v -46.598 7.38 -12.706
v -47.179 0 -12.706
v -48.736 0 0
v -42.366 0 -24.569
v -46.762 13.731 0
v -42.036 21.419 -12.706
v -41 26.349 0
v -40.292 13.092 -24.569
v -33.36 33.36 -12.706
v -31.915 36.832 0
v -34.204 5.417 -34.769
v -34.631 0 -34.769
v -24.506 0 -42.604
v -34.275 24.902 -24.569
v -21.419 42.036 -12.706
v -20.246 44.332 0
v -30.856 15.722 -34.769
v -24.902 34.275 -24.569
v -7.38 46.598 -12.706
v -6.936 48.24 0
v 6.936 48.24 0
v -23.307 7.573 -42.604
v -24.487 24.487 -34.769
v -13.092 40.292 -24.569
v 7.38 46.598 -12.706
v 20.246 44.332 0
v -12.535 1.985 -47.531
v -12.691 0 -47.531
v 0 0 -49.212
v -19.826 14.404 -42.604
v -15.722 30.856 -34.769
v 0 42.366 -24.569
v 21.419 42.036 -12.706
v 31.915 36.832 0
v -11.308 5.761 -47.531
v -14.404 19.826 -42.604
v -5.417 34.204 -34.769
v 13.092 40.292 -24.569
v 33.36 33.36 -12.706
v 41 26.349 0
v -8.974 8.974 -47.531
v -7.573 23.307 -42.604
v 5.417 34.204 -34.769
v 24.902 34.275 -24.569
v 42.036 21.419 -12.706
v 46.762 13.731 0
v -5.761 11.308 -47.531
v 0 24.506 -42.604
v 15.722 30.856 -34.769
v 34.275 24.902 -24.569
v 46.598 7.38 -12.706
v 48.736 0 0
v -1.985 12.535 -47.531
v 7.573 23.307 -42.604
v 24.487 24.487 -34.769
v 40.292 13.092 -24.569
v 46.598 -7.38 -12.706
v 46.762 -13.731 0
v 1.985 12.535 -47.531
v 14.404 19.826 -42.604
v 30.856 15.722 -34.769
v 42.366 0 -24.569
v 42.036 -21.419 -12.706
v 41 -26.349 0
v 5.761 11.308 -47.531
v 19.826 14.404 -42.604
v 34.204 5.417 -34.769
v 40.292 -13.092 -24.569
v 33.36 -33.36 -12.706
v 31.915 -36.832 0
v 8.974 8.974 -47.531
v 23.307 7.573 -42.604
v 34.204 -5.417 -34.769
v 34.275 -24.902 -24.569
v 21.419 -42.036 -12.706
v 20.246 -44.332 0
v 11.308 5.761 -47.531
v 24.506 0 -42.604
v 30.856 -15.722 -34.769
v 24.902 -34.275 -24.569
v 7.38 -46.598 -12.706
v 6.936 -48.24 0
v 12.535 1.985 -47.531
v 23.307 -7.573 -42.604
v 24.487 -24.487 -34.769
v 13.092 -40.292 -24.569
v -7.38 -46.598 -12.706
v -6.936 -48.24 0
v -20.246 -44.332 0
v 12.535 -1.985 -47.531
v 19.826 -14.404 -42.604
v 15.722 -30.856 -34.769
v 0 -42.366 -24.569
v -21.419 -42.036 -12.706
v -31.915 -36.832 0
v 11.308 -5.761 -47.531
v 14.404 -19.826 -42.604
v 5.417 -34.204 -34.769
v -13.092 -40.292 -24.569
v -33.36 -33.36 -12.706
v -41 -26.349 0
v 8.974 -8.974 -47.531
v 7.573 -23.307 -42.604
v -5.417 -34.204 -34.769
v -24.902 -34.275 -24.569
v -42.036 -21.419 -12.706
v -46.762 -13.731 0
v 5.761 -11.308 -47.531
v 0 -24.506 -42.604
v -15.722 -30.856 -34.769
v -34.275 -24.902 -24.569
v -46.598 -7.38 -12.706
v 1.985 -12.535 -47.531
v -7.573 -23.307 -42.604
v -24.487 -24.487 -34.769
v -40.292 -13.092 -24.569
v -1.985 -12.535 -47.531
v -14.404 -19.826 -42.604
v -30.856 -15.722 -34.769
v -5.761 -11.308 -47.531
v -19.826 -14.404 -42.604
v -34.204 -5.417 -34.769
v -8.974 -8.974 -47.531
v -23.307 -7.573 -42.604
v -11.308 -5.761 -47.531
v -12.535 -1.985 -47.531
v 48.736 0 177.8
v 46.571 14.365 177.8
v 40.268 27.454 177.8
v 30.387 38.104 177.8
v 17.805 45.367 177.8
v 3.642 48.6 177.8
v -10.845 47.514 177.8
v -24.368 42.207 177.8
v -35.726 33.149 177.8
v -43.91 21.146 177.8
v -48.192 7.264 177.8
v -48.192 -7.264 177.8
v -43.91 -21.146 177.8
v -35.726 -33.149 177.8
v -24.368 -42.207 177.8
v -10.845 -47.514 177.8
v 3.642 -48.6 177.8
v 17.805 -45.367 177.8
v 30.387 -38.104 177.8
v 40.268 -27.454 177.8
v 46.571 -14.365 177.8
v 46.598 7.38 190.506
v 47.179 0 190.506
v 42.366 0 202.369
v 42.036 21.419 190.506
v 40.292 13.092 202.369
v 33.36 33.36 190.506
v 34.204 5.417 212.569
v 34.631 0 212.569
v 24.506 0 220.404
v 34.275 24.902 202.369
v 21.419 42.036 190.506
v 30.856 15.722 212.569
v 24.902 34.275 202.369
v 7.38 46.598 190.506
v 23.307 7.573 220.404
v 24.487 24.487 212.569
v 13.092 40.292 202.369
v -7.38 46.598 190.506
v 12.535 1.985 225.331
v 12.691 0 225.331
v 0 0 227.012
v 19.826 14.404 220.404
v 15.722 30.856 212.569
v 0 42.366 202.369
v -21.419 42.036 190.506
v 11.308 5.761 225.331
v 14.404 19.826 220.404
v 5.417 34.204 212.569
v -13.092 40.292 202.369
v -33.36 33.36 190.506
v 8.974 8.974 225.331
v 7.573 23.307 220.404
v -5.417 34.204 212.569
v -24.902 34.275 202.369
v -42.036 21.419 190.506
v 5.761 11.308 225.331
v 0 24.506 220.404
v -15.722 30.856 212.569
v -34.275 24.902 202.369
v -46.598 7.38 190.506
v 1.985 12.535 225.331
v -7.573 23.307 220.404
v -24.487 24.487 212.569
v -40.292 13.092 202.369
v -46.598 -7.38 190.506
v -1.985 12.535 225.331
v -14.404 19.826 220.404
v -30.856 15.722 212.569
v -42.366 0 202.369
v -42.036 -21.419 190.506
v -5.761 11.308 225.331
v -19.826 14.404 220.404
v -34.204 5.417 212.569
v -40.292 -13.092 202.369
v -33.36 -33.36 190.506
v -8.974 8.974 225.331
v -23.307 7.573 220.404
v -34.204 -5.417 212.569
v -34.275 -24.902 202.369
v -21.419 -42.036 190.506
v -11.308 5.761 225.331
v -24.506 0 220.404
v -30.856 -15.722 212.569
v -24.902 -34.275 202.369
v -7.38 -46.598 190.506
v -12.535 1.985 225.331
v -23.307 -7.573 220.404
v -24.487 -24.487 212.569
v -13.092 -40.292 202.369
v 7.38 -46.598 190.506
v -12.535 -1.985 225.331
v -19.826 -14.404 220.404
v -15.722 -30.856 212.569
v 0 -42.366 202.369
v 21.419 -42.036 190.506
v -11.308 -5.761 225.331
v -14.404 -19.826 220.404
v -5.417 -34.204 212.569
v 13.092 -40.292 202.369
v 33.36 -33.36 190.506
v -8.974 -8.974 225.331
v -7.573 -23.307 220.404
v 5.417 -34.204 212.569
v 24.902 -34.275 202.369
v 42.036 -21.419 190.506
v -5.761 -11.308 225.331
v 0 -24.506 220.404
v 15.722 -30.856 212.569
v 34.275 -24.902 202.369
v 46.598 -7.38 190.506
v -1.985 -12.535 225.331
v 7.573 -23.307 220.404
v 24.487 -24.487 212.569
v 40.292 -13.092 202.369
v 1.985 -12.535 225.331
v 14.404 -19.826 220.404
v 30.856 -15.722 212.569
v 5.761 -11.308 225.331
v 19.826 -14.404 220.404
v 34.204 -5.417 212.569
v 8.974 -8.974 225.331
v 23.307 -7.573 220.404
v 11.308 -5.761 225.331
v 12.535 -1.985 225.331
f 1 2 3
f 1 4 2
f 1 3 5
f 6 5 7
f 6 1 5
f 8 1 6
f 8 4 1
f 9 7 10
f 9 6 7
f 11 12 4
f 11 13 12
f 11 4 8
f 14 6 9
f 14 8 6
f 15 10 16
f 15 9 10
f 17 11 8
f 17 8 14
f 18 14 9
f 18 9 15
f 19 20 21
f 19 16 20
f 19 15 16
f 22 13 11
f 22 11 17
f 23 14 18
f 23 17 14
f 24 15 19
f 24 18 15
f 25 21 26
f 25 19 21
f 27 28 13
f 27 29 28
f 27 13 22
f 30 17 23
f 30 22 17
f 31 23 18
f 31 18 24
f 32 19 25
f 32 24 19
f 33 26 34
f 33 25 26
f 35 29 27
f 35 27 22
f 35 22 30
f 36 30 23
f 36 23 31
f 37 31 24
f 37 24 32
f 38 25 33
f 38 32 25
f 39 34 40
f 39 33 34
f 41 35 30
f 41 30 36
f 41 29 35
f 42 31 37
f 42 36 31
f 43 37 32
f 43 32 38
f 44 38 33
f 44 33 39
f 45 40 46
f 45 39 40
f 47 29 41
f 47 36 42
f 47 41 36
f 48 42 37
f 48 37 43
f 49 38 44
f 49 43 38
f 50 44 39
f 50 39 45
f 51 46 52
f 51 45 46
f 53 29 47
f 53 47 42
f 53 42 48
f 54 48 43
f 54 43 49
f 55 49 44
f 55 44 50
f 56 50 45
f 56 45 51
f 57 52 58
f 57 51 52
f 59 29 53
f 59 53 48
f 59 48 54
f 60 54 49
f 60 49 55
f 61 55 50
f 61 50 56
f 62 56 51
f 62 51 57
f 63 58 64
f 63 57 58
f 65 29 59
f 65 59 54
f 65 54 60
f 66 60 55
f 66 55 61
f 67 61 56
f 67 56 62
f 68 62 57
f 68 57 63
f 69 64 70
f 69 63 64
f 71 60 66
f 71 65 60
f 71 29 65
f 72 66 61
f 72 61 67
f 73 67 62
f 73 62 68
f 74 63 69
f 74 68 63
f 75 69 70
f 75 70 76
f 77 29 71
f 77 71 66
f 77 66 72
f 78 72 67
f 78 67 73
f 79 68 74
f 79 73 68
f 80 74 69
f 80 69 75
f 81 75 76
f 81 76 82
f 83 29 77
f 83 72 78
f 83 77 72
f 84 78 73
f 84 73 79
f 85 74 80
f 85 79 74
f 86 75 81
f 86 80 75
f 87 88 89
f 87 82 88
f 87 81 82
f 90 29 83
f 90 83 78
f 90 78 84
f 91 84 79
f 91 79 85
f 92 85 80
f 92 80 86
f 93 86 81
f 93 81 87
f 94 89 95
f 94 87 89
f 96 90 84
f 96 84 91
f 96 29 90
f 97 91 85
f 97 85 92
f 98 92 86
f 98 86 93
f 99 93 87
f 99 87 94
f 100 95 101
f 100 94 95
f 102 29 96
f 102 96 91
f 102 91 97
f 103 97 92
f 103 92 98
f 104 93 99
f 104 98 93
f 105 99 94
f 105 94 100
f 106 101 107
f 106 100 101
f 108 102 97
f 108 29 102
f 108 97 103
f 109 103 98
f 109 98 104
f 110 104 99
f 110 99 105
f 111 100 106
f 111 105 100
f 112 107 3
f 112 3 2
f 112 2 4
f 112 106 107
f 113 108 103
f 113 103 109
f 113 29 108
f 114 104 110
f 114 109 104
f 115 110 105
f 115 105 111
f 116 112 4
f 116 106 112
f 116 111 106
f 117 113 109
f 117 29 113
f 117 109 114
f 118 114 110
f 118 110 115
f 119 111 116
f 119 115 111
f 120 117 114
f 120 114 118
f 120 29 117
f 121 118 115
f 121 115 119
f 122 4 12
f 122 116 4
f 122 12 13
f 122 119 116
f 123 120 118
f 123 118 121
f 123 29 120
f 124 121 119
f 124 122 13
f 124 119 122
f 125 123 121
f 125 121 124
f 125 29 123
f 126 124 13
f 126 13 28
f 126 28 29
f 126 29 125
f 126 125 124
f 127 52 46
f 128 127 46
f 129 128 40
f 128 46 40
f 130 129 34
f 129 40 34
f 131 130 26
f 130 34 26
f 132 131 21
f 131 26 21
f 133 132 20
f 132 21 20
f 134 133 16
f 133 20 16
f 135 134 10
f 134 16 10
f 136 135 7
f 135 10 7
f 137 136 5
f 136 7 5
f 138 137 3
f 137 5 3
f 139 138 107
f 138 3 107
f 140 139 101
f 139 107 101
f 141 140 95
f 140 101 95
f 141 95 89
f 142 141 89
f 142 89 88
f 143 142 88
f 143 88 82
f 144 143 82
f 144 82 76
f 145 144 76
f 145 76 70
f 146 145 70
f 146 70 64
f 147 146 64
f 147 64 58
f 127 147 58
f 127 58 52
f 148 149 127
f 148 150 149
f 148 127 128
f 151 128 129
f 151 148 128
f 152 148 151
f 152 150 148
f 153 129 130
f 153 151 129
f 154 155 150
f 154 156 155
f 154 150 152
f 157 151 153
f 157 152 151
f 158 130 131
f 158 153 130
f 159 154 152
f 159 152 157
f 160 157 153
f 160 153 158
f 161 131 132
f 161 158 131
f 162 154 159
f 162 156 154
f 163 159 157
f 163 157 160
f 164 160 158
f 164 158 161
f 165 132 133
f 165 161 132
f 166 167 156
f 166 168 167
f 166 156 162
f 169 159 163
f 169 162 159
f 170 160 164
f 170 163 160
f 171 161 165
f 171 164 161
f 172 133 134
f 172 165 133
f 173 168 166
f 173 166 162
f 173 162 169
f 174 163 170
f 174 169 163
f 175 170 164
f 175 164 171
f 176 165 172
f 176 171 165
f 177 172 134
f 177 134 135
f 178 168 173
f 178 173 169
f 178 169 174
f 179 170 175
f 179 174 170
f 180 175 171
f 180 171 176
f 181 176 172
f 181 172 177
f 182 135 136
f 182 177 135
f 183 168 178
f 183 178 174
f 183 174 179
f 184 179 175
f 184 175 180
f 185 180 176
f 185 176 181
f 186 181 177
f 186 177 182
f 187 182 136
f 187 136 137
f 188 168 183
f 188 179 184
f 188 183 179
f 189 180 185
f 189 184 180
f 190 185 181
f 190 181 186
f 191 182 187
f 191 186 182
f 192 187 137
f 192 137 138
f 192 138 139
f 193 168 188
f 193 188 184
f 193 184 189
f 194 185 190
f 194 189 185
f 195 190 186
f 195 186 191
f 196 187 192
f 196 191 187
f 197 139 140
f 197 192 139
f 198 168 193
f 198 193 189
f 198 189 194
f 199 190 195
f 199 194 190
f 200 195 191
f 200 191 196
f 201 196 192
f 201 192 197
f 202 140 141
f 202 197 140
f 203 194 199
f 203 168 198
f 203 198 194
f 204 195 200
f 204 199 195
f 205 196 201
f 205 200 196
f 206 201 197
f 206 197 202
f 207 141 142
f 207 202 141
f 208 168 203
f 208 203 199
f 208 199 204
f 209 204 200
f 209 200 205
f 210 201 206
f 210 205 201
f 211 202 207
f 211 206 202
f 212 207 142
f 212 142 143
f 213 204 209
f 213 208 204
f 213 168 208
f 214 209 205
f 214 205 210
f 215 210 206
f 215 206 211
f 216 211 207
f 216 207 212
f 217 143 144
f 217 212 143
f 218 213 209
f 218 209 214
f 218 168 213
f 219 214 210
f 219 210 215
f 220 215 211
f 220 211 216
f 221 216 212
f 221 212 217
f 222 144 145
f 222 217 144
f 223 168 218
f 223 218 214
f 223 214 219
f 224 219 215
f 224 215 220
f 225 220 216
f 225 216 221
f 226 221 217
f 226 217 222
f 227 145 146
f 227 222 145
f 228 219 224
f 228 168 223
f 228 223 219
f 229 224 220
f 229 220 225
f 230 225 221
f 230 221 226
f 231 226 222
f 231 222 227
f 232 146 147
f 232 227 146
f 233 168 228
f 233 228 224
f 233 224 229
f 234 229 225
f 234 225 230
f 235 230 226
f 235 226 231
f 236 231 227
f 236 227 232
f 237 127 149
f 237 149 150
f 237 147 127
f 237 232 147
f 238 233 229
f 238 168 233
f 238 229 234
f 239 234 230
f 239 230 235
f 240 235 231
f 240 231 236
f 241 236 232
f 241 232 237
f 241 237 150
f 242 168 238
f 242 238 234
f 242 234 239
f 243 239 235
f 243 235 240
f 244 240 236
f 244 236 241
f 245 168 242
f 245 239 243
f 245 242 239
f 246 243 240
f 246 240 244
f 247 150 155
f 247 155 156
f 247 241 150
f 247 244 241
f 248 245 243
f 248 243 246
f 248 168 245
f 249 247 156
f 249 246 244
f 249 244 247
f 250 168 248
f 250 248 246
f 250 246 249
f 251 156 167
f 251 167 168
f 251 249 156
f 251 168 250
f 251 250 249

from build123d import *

# Parameters (mm, degrees)
SKETCH1_R           = 48.73625
BOSS_EXTRUDE1_DEPTH = 177.8
DOME1_FACE_RADIUS   = 48.73625
DOME1_HEIGHT        = 49.2125
DOME2_FACE_RADIUS   = 48.73625
DOME2_HEIGHT        = 49.2125


with BuildPart() as part:
    # Sketch1 → Boss-Extrude1 (new body)
    with BuildSketch(Plane.XY):
        Circle(SKETCH1_R)
    extrude(amount=BOSS_EXTRUDE1_DEPTH)

    # Dome1: a dome of height H over a round flat face of radius A is a cap of a sphere of radius (A * A + H * H) / (2 * H)
    dome1_r = (DOME1_FACE_RADIUS * DOME1_FACE_RADIUS + DOME1_HEIGHT * DOME1_HEIGHT) / (2 * DOME1_HEIGHT)
    dome1_base = Plane((0, 0, 177.8), z_dir=(0, 0, 1))
    with Locations(dome1_base.offset(DOME1_HEIGHT - dome1_r)):
        dome1_ball = Sphere(dome1_r, mode=Mode.PRIVATE)
    add(split(dome1_ball, bisect_by=dome1_base, keep=Keep.TOP, mode=Mode.PRIVATE))

    # Dome2: a dome of height H over a round flat face of radius A is a cap of a sphere of radius (A * A + H * H) / (2 * H)
    dome2_r = (DOME2_FACE_RADIUS * DOME2_FACE_RADIUS + DOME2_HEIGHT * DOME2_HEIGHT) / (2 * DOME2_HEIGHT)
    dome2_base = Plane((0, 0, 0), z_dir=(0, 0, -1))
    with Locations(dome2_base.offset(DOME2_HEIGHT - dome2_r)):
        dome2_ball = Sphere(dome2_r, mode=Mode.PRIVATE)
    add(split(dome2_ball, bisect_by=dome2_base, keep=Keep.TOP, mode=Mode.PRIVATE))


solid = part.part
